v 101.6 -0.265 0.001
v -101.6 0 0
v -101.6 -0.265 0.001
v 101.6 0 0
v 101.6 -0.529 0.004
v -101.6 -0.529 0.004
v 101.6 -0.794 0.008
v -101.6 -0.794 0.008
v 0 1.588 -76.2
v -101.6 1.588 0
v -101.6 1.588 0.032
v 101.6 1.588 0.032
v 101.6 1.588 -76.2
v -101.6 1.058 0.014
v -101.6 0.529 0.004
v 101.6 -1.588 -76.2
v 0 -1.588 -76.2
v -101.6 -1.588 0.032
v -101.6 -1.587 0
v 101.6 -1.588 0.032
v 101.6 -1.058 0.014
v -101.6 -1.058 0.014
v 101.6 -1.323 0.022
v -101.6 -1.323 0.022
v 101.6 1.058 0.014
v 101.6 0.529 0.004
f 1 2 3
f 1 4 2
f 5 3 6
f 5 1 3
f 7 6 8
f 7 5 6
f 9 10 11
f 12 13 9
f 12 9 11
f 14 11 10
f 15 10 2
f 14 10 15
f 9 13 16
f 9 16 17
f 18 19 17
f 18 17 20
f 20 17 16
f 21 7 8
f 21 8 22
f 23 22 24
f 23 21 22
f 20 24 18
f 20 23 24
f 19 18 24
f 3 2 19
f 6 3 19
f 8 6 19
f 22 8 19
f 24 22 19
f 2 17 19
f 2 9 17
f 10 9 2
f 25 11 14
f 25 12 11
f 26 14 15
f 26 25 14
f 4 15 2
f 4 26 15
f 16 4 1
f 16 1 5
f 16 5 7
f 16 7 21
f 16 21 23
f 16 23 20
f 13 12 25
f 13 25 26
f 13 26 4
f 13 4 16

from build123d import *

# Parameters (mm, degrees)
BOSS_EXTRUDE1_DEPTH = 1.5875
BOSS_EXTRUDE2_DEPTH = 101.6


with BuildPart() as part:
    # Sketch1 → Boss-Extrude1 (new, symmetric)
    with BuildSketch(Plane(origin=(0, 0, 0), x_dir=(1, 0, 0), z_dir=(0, 1, 0))):
        Polygon((-101.6, 0), (101.6, 0), (101.6, 76.2), (0, 76.2), align=None)
    extrude(amount=BOSS_EXTRUDE1_DEPTH, both=True)

    # Sketch2 → Boss-Extrude2 (add, symmetric)
    with BuildSketch(Plane(origin=(0, 0, 0), x_dir=(0, 0, -1), z_dir=(1, 0, 0))):
        with BuildLine():
            ThreePointArc((-0.007951018, -0.79375), (-0.017893832, -1.190684781), (-0.031813653, -1.5875))
            Line((-0.031813653, -1.5875), (0, -1.5875))
            Line((0, -1.5875), (-0.007951018, -0.79375))
        make_face()
        with BuildLine():
            Line((0, -1.5875), (0, 0))
            ThreePointArc((0, 0), (-0.001987804, -0.396894911), (-0.007951018, -0.79375))
            Line((-0.007951018, -0.79375), (0, -1.5875))
        make_face()
        with BuildLine():
            Line((0, 0), (0, 1.5875))
            Line((0, 1.5875), (-0.031813653, 1.5875))
            ThreePointArc((-0.031813653, 1.5875), (-0.007954212, 0.793909371), (0, 0))
        make_face()
    extrude(amount=BOSS_EXTRUDE2_DEPTH, both=True)


solid = part.part
